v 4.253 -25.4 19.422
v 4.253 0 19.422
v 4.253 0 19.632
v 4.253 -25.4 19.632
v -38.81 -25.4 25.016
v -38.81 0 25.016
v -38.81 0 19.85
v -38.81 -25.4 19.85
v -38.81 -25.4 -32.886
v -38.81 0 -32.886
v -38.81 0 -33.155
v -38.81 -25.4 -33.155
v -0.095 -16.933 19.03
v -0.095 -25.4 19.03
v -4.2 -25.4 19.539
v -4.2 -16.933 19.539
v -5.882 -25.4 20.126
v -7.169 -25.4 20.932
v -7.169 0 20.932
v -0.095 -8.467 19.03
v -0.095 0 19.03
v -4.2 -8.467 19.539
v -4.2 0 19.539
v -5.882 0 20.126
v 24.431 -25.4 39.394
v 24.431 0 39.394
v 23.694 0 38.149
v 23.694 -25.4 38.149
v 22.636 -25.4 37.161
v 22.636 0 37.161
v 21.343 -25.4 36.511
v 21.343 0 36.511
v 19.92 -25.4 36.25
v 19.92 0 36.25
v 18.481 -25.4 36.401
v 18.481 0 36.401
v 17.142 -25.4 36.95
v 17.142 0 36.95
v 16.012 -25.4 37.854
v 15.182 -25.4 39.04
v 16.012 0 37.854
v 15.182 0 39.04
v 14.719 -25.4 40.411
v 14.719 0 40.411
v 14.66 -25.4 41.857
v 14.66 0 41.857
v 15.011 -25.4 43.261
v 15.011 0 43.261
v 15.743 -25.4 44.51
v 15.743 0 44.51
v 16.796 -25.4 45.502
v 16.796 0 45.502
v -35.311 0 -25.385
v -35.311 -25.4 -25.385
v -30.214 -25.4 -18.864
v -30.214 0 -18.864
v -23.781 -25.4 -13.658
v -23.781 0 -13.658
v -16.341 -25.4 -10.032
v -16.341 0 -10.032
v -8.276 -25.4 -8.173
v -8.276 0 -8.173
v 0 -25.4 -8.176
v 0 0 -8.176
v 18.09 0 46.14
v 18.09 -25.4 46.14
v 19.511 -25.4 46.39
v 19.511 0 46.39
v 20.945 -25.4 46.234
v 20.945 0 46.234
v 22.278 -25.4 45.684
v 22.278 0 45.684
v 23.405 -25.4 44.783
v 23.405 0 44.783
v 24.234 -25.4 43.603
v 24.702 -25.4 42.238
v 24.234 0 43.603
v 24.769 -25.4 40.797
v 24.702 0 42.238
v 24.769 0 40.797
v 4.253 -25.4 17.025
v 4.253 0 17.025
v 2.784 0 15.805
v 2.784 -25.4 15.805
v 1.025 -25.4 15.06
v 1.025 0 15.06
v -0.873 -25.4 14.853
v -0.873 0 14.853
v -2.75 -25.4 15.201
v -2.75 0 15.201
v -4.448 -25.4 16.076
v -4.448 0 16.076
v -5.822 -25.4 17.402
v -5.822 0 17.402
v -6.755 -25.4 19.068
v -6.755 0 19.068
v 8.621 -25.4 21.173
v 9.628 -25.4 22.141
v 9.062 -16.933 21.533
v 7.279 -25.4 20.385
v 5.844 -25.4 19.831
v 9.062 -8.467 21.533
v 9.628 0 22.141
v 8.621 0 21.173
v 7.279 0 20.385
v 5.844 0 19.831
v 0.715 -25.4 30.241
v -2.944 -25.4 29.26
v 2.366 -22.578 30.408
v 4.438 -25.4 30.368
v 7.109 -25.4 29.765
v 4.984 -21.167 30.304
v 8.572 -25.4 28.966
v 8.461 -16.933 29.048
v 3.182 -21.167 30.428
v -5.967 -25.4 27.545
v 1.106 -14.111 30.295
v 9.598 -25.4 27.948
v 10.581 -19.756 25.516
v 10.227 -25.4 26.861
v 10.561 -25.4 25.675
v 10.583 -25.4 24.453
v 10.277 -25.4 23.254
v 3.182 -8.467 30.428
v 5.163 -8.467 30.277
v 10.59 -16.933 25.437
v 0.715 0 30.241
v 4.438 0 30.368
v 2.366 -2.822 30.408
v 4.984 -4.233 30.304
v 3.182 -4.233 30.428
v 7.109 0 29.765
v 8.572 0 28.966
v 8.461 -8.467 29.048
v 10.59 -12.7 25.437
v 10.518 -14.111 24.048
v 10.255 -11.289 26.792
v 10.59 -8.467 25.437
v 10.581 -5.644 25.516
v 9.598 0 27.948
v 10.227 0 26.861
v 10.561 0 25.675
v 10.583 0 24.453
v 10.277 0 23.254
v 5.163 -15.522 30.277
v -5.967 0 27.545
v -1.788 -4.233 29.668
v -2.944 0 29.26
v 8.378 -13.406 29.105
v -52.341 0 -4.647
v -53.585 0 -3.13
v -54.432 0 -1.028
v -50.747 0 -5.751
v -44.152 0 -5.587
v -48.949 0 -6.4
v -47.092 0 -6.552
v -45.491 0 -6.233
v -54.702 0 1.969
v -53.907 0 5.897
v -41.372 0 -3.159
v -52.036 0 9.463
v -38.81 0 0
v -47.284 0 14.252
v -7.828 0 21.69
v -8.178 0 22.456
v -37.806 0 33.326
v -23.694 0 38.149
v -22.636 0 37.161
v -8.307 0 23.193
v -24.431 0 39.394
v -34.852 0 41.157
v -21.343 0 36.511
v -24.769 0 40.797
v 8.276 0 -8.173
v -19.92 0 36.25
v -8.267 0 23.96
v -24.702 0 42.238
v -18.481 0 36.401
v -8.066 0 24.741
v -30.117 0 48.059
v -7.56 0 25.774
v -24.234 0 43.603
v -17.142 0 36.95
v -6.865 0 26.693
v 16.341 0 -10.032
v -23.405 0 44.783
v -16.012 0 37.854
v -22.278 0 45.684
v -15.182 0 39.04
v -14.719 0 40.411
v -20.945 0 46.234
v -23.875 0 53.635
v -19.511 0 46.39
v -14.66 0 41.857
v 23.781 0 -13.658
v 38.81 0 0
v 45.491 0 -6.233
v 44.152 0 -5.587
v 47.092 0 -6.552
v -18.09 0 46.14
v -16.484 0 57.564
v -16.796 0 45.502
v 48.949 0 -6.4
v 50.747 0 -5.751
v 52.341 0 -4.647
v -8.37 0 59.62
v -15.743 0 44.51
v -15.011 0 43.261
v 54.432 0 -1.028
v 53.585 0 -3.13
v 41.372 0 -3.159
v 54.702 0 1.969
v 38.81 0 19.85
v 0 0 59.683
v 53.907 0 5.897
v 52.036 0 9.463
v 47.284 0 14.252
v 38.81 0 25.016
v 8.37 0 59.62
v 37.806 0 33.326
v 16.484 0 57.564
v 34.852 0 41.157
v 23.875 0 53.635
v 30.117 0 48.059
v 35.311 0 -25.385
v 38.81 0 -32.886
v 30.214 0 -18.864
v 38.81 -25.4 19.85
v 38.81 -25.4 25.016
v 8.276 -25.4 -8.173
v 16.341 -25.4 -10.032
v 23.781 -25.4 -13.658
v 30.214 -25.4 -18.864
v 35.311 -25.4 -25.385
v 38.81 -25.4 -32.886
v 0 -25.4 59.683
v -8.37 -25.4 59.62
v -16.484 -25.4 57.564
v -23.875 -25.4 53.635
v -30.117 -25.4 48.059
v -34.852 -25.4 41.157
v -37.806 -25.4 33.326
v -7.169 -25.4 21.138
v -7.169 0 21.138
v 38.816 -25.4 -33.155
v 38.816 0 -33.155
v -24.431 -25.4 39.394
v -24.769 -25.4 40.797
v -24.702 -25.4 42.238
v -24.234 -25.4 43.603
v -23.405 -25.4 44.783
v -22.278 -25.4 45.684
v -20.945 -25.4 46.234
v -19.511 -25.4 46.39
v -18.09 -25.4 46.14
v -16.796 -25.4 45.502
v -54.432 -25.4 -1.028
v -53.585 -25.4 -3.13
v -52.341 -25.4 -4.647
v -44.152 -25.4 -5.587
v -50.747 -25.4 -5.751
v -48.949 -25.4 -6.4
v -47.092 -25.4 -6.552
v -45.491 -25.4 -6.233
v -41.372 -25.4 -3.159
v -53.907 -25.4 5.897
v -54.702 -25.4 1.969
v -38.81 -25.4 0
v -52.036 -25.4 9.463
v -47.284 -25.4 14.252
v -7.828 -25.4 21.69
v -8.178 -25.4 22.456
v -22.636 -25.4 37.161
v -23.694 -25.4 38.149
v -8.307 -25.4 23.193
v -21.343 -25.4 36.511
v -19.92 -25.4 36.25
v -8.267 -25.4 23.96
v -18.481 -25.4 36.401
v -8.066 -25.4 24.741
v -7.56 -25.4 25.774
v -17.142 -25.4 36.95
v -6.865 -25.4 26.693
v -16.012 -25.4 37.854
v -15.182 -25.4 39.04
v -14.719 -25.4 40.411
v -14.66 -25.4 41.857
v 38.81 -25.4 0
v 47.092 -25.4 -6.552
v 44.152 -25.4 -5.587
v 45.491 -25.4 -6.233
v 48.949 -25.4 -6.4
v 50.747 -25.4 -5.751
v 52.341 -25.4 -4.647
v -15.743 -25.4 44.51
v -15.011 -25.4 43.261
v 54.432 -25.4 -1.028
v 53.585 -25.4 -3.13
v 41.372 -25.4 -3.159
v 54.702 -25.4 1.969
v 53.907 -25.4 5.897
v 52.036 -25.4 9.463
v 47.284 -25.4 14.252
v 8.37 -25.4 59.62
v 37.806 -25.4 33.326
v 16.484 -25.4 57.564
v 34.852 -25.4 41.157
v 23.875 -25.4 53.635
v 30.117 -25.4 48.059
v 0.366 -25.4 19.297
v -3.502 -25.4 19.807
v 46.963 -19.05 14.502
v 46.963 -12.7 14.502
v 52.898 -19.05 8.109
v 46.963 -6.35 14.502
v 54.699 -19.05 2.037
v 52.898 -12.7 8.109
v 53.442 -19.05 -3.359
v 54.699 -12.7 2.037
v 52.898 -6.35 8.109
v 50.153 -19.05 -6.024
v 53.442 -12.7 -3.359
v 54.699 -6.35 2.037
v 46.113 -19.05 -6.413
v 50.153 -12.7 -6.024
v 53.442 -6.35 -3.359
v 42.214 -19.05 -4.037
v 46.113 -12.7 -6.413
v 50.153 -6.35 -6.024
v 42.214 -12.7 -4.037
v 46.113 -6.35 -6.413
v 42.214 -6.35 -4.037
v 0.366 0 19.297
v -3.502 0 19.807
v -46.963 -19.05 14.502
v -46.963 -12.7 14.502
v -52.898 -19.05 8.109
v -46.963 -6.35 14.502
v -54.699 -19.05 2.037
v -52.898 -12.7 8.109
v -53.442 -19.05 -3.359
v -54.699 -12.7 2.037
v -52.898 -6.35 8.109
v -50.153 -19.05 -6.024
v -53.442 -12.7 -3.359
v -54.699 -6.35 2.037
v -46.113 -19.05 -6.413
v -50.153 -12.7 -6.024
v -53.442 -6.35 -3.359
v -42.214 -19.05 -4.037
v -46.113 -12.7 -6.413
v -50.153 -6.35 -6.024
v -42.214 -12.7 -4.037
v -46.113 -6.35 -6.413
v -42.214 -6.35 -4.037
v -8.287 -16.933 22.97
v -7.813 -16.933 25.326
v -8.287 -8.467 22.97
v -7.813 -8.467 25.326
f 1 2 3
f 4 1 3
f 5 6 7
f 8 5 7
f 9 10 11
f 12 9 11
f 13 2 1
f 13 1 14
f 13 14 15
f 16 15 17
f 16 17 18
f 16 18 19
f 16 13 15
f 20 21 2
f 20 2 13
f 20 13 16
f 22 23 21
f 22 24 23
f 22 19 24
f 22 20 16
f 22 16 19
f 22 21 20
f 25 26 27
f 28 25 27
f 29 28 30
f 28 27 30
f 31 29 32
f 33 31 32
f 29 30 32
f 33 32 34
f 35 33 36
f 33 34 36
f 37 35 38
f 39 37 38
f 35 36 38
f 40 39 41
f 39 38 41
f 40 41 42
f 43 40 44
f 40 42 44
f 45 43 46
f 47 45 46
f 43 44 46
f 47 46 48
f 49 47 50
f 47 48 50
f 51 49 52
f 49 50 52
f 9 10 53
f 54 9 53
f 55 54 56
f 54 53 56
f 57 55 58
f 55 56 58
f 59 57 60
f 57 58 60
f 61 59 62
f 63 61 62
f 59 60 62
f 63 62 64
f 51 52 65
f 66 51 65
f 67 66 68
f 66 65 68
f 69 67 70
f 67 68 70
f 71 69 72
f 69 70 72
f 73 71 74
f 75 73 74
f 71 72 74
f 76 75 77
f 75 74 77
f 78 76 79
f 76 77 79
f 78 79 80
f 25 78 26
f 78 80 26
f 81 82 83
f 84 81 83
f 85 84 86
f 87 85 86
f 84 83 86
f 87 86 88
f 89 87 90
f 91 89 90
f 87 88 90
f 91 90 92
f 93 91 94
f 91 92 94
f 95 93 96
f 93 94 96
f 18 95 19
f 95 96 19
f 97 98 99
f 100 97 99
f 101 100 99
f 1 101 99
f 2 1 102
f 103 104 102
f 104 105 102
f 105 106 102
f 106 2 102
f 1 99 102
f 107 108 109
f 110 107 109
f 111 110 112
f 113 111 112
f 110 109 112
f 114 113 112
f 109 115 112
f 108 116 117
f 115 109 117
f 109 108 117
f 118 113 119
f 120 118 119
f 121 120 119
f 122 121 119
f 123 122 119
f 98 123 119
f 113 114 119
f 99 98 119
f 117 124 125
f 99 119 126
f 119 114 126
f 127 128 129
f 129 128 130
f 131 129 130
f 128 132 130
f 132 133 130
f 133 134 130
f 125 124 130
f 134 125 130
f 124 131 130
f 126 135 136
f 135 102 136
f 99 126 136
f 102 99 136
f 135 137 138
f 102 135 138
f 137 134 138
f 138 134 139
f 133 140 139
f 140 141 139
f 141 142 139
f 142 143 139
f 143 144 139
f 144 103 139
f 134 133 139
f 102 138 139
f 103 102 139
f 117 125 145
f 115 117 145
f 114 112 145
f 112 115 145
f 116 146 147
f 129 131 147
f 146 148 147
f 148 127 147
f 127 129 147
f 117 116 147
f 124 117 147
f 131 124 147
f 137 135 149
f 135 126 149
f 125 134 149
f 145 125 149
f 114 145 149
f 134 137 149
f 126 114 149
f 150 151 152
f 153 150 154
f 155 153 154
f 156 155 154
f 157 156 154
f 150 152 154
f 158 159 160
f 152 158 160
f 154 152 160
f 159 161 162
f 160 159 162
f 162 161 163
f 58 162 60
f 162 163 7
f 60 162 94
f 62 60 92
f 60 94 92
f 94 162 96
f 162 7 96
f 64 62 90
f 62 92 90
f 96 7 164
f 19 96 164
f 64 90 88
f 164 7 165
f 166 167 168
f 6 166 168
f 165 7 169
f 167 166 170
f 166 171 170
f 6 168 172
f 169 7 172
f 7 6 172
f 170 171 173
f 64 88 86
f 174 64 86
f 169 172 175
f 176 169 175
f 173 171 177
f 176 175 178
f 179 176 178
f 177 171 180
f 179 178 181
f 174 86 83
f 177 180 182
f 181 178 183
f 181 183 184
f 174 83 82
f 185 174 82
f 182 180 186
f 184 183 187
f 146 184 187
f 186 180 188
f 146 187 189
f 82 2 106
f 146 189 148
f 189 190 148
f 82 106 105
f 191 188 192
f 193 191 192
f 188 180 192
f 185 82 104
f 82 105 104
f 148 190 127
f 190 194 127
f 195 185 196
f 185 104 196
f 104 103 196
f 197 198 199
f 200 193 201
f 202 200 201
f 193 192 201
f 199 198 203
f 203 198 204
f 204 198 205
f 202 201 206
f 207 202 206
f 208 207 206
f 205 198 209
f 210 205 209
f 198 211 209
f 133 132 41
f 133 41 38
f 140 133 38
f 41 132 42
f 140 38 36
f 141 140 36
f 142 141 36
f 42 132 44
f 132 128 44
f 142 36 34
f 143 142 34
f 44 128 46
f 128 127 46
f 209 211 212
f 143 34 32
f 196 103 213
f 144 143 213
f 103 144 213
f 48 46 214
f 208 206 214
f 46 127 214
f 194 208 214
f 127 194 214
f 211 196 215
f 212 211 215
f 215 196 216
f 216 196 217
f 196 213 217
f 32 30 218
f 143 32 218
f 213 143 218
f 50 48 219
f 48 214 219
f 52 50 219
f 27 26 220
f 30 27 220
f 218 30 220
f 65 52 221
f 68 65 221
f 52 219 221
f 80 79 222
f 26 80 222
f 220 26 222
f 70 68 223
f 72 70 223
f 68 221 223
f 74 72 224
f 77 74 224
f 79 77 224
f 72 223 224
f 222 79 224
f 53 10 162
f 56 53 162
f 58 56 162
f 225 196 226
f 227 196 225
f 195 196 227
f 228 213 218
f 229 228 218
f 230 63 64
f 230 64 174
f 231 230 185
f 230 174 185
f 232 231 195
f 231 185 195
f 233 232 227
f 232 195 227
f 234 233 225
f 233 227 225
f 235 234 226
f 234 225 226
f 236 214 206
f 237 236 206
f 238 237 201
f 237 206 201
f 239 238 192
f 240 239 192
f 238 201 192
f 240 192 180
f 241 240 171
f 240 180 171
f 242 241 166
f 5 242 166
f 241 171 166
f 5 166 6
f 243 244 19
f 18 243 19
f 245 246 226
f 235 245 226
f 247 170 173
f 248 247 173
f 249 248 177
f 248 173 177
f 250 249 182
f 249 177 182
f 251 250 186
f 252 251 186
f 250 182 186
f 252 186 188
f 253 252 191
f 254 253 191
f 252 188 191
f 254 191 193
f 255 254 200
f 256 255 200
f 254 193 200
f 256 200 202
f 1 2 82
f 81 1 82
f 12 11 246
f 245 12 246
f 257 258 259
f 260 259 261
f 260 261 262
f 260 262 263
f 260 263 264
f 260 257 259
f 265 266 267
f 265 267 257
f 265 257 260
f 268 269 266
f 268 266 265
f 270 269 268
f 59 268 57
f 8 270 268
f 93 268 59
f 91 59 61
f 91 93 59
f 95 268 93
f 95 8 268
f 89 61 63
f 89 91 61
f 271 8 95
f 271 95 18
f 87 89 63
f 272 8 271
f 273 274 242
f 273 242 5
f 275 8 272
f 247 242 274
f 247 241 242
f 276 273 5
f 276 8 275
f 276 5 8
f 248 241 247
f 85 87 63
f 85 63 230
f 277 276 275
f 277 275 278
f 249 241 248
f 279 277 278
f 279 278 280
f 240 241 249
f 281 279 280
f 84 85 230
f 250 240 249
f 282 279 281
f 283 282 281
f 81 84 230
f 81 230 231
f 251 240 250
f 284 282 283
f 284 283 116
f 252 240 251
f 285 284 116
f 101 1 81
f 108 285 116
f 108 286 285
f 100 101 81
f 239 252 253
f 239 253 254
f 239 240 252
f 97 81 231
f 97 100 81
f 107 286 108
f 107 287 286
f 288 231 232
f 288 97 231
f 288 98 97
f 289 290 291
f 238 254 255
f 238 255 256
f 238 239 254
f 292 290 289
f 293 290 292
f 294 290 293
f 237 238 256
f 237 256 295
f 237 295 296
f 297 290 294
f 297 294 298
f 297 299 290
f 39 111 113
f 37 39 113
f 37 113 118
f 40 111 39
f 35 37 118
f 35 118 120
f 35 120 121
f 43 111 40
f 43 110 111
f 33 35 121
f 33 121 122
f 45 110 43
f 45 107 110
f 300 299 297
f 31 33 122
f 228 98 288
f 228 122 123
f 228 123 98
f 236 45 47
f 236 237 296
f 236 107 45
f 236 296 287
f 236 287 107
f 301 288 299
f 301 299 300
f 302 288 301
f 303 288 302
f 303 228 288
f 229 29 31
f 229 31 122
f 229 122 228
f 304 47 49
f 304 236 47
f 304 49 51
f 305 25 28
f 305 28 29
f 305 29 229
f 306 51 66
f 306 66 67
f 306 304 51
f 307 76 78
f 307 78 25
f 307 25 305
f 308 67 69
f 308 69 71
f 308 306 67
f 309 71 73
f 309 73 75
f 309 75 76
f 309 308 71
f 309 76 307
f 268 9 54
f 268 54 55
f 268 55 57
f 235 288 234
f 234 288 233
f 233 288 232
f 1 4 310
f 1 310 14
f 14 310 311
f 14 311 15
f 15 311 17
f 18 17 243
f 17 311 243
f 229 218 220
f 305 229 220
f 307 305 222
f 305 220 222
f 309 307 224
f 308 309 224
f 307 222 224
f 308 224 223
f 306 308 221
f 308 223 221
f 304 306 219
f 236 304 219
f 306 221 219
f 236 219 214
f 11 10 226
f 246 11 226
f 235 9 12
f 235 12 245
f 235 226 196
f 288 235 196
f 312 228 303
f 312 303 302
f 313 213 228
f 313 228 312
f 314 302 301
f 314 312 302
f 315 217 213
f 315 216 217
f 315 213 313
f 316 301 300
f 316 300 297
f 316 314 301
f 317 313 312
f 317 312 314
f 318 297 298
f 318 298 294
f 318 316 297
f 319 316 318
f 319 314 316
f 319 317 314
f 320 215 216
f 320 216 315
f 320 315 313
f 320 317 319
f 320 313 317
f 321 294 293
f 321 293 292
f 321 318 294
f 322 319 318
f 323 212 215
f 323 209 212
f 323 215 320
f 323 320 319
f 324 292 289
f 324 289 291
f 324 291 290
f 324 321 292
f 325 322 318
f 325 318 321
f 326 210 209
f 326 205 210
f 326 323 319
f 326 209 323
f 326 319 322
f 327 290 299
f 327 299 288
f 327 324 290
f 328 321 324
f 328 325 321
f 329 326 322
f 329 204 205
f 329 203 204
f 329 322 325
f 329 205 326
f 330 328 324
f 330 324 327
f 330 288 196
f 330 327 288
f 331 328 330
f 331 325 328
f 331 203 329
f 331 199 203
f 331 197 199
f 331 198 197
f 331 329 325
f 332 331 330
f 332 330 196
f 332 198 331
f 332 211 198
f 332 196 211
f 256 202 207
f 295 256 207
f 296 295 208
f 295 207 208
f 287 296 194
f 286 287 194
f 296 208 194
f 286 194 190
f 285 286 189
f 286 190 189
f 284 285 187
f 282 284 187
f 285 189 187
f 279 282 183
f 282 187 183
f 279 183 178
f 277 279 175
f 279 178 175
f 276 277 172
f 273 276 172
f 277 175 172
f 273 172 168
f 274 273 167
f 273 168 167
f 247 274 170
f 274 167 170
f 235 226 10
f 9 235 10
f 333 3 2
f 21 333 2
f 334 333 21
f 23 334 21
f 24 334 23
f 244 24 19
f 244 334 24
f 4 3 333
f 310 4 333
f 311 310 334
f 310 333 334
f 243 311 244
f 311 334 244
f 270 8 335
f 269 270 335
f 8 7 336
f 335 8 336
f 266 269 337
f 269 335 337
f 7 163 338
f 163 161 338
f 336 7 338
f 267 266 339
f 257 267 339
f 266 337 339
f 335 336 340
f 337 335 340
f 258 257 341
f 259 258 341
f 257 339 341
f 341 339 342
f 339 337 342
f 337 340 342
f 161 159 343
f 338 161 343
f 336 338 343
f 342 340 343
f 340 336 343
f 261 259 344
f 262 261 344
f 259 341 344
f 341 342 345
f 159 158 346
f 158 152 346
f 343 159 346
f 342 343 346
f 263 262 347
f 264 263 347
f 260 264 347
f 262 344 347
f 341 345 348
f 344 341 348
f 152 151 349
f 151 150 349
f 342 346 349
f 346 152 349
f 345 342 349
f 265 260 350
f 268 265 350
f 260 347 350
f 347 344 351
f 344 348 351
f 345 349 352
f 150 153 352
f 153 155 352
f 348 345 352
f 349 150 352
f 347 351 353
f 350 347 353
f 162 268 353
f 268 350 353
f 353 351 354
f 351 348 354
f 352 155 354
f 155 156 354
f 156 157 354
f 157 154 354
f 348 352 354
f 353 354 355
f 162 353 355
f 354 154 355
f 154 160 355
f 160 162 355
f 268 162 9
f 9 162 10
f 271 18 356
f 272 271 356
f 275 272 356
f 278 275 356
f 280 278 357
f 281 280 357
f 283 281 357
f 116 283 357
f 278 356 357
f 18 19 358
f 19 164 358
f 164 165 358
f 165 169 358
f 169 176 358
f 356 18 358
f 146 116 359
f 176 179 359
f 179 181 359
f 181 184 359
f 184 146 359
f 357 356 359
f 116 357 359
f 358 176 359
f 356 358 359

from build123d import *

# Parameters (mm, degrees)
F1_DEPTH = 25.4


with BuildPart() as f1:
    # F0 (on Front) → F1 (new body)
    with BuildSketch(Plane.XZ):
        with BuildLine():
            add(Edge.make_bspline(
                [(-38.8101190329, 19.8498107493), (-44.4914015421, 16.400660606), (-54.6677833754, 10.2225012202), (-55.6160392018, -4.3392453121), (-45.2407556156, -8.3519283639), (-41.0246283015, -2.876141815), (-38.8101190329, 0)],
                knots=[0, 0, 0, 0, 0.3147460153, 0.5637768632, 0.7708749979, 1, 1, 1, 1], degree=3))
            Line((-38.8101190329, 0), (-38.8101190329, 19.8498107493))
        make_face()
        with BuildLine():
            Line((-38.8101190329, 0), (-38.8101190329, -32.8855216503))
            ThreePointArc((-38.8101190329, -32.8855216503), (-23.781091994, -13.6575199069), (0, -8.1759719178))
            ThreePointArc((0, -8.1759719178), (23.781091994, -13.6575199069), (38.8101190329, -32.8855216503))
            Line((38.8101190329, -32.8855216503), (38.8101190329, 0))
            Line((38.8101190329, 0), (38.8101190329, 19.8498107493))
            Line((38.8101190329, 19.8498107493), (38.8101190329, 25.0159613788))
            ThreePointArc((38.8101190329, 25.0159613788), (27.1636731374, 51.0353532928), (0, 59.6830882132))
            ThreePointArc((0, 59.6830882132), (-27.1636731374, 51.0353532928), (-38.8101190329, 25.0159613788))
            Line((-38.8101190329, 25.0159613788), (-38.8101190329, 19.8498107493))
            Line((-38.8101190329, 19.8498107493), (-38.8101190329, 0))
        make_face()
        with BuildLine():
            ThreePointArc((-24.4305338711, 39.3942371011), (-22.8733460672, 45.2731587171), (-16.7959909886, 45.5018691719))
            ThreePointArc((-16.7959909886, 45.5018691719), (-16.5444679316, 37.3620581524), (-24.4305338711, 39.3942371011))
        make_face(mode=Mode.SUBTRACT)
        with BuildLine():
            add(Edge.make_bspline(
                [(-7.1690157056, 20.9322031587), (-9.1556315433, 22.6596609859), (-8.4263815676, 25.5454906165), (-5.9667392634, 27.5447238237)],
                knots=[0.8032541264, 0.8032541264, 0.8032541264, 0.8032541264, 1, 1, 1, 1], degree=3))
            add(Edge.make_bspline(
                [(-5.9667392634, 27.5447238237), (-2.3532911376, 30.4817872629), (10.2919108606, 32.243250445), (11.6652255459, 22.0177812438), (6.2072312879, 19.8203238219), (4.2526121251, 19.4223705445)],
                knots=[0, 0, 0, 0, 0.2890383723, 0.4974038767, 0.5949797049, 0.5949797049, 0.5949797049, 0.5949797049], degree=3))
            Line((4.2526121251, 19.4223705445), (4.2526121251, 17.0248039067))
            ThreePointArc((4.2526121251, 17.0248039067), (-2.7503606956, 15.2014239043), (-7.1690157056, 20.9322031587))
        make_face(mode=Mode.SUBTRACT)
        with BuildLine():
            ThreePointArc((16.7959909886, 45.5018691719), (22.8733460672, 45.2731587171), (24.4305338711, 39.3942371011))
            ThreePointArc((24.4305338711, 39.3942371011), (16.5444679316, 37.3620581524), (16.7959909886, 45.5018691719))
        make_face(mode=Mode.SUBTRACT)
        with BuildLine():
            Line((38.8101190329, 19.8498107493), (38.8101190329, 0))
            add(Edge.make_bspline(
                [(38.8101190329, 19.8498107493), (44.4914015421, 16.400660606), (54.6677833754, 10.2225012202), (55.6160392018, -4.3392453121), (45.2407556156, -8.3519283639), (41.0246283015, -2.876141815), (38.8101190329, 0)],
                knots=[0, 0, 0, 0, 0.3147460153, 0.5637768632, 0.7708749979, 1, 1, 1, 1], degree=3))
        make_face()
    extrude(amount=F1_DEPTH)


with BuildPart() as f1b:
    # F0 (on Front) → F1, piece 2 (new body)
    with BuildSketch(Plane.XZ):
        Polygon((0, -32.8855216503), (-38.8101190329, -32.8855216503), (-38.8101190329, -33.1550724804), (38.8164743781, -33.1550724804), (38.8101190329, -32.8855216503), align=None)
    extrude(amount=F1_DEPTH)


with BuildPart() as f1c:
    # F0 (on Front) → F1, piece 3 (new body)
    with BuildSketch(Plane.XZ):
        with BuildLine():
            add(Edge.make_bspline(
                [(4.2526121251, 19.4223705445), (0.0805012352, 18.5729441018), (-5.0659918564, 19.103522978), (-7.1690157056, 20.9322031587)],
                knots=[0.5949797049, 0.5949797049, 0.5949797049, 0.5949797049, 0.8032541264, 0.8032541264, 0.8032541264, 0.8032541264], degree=3))
            Line((4.2526121251, 19.4223705445), (4.2526121251, 19.6319073439))
            ThreePointArc((4.2526121251, 19.6319073439), (-1.581830803, 19.4473102325), (-7.1690157056, 21.1379211396))
            Line((-7.1690157056, 21.1379211396), (-7.1690157056, 20.9322031587))
        make_face()
    extrude(amount=F1_DEPTH)


solid = Compound([f1.part, f1b.part, f1c.part])
